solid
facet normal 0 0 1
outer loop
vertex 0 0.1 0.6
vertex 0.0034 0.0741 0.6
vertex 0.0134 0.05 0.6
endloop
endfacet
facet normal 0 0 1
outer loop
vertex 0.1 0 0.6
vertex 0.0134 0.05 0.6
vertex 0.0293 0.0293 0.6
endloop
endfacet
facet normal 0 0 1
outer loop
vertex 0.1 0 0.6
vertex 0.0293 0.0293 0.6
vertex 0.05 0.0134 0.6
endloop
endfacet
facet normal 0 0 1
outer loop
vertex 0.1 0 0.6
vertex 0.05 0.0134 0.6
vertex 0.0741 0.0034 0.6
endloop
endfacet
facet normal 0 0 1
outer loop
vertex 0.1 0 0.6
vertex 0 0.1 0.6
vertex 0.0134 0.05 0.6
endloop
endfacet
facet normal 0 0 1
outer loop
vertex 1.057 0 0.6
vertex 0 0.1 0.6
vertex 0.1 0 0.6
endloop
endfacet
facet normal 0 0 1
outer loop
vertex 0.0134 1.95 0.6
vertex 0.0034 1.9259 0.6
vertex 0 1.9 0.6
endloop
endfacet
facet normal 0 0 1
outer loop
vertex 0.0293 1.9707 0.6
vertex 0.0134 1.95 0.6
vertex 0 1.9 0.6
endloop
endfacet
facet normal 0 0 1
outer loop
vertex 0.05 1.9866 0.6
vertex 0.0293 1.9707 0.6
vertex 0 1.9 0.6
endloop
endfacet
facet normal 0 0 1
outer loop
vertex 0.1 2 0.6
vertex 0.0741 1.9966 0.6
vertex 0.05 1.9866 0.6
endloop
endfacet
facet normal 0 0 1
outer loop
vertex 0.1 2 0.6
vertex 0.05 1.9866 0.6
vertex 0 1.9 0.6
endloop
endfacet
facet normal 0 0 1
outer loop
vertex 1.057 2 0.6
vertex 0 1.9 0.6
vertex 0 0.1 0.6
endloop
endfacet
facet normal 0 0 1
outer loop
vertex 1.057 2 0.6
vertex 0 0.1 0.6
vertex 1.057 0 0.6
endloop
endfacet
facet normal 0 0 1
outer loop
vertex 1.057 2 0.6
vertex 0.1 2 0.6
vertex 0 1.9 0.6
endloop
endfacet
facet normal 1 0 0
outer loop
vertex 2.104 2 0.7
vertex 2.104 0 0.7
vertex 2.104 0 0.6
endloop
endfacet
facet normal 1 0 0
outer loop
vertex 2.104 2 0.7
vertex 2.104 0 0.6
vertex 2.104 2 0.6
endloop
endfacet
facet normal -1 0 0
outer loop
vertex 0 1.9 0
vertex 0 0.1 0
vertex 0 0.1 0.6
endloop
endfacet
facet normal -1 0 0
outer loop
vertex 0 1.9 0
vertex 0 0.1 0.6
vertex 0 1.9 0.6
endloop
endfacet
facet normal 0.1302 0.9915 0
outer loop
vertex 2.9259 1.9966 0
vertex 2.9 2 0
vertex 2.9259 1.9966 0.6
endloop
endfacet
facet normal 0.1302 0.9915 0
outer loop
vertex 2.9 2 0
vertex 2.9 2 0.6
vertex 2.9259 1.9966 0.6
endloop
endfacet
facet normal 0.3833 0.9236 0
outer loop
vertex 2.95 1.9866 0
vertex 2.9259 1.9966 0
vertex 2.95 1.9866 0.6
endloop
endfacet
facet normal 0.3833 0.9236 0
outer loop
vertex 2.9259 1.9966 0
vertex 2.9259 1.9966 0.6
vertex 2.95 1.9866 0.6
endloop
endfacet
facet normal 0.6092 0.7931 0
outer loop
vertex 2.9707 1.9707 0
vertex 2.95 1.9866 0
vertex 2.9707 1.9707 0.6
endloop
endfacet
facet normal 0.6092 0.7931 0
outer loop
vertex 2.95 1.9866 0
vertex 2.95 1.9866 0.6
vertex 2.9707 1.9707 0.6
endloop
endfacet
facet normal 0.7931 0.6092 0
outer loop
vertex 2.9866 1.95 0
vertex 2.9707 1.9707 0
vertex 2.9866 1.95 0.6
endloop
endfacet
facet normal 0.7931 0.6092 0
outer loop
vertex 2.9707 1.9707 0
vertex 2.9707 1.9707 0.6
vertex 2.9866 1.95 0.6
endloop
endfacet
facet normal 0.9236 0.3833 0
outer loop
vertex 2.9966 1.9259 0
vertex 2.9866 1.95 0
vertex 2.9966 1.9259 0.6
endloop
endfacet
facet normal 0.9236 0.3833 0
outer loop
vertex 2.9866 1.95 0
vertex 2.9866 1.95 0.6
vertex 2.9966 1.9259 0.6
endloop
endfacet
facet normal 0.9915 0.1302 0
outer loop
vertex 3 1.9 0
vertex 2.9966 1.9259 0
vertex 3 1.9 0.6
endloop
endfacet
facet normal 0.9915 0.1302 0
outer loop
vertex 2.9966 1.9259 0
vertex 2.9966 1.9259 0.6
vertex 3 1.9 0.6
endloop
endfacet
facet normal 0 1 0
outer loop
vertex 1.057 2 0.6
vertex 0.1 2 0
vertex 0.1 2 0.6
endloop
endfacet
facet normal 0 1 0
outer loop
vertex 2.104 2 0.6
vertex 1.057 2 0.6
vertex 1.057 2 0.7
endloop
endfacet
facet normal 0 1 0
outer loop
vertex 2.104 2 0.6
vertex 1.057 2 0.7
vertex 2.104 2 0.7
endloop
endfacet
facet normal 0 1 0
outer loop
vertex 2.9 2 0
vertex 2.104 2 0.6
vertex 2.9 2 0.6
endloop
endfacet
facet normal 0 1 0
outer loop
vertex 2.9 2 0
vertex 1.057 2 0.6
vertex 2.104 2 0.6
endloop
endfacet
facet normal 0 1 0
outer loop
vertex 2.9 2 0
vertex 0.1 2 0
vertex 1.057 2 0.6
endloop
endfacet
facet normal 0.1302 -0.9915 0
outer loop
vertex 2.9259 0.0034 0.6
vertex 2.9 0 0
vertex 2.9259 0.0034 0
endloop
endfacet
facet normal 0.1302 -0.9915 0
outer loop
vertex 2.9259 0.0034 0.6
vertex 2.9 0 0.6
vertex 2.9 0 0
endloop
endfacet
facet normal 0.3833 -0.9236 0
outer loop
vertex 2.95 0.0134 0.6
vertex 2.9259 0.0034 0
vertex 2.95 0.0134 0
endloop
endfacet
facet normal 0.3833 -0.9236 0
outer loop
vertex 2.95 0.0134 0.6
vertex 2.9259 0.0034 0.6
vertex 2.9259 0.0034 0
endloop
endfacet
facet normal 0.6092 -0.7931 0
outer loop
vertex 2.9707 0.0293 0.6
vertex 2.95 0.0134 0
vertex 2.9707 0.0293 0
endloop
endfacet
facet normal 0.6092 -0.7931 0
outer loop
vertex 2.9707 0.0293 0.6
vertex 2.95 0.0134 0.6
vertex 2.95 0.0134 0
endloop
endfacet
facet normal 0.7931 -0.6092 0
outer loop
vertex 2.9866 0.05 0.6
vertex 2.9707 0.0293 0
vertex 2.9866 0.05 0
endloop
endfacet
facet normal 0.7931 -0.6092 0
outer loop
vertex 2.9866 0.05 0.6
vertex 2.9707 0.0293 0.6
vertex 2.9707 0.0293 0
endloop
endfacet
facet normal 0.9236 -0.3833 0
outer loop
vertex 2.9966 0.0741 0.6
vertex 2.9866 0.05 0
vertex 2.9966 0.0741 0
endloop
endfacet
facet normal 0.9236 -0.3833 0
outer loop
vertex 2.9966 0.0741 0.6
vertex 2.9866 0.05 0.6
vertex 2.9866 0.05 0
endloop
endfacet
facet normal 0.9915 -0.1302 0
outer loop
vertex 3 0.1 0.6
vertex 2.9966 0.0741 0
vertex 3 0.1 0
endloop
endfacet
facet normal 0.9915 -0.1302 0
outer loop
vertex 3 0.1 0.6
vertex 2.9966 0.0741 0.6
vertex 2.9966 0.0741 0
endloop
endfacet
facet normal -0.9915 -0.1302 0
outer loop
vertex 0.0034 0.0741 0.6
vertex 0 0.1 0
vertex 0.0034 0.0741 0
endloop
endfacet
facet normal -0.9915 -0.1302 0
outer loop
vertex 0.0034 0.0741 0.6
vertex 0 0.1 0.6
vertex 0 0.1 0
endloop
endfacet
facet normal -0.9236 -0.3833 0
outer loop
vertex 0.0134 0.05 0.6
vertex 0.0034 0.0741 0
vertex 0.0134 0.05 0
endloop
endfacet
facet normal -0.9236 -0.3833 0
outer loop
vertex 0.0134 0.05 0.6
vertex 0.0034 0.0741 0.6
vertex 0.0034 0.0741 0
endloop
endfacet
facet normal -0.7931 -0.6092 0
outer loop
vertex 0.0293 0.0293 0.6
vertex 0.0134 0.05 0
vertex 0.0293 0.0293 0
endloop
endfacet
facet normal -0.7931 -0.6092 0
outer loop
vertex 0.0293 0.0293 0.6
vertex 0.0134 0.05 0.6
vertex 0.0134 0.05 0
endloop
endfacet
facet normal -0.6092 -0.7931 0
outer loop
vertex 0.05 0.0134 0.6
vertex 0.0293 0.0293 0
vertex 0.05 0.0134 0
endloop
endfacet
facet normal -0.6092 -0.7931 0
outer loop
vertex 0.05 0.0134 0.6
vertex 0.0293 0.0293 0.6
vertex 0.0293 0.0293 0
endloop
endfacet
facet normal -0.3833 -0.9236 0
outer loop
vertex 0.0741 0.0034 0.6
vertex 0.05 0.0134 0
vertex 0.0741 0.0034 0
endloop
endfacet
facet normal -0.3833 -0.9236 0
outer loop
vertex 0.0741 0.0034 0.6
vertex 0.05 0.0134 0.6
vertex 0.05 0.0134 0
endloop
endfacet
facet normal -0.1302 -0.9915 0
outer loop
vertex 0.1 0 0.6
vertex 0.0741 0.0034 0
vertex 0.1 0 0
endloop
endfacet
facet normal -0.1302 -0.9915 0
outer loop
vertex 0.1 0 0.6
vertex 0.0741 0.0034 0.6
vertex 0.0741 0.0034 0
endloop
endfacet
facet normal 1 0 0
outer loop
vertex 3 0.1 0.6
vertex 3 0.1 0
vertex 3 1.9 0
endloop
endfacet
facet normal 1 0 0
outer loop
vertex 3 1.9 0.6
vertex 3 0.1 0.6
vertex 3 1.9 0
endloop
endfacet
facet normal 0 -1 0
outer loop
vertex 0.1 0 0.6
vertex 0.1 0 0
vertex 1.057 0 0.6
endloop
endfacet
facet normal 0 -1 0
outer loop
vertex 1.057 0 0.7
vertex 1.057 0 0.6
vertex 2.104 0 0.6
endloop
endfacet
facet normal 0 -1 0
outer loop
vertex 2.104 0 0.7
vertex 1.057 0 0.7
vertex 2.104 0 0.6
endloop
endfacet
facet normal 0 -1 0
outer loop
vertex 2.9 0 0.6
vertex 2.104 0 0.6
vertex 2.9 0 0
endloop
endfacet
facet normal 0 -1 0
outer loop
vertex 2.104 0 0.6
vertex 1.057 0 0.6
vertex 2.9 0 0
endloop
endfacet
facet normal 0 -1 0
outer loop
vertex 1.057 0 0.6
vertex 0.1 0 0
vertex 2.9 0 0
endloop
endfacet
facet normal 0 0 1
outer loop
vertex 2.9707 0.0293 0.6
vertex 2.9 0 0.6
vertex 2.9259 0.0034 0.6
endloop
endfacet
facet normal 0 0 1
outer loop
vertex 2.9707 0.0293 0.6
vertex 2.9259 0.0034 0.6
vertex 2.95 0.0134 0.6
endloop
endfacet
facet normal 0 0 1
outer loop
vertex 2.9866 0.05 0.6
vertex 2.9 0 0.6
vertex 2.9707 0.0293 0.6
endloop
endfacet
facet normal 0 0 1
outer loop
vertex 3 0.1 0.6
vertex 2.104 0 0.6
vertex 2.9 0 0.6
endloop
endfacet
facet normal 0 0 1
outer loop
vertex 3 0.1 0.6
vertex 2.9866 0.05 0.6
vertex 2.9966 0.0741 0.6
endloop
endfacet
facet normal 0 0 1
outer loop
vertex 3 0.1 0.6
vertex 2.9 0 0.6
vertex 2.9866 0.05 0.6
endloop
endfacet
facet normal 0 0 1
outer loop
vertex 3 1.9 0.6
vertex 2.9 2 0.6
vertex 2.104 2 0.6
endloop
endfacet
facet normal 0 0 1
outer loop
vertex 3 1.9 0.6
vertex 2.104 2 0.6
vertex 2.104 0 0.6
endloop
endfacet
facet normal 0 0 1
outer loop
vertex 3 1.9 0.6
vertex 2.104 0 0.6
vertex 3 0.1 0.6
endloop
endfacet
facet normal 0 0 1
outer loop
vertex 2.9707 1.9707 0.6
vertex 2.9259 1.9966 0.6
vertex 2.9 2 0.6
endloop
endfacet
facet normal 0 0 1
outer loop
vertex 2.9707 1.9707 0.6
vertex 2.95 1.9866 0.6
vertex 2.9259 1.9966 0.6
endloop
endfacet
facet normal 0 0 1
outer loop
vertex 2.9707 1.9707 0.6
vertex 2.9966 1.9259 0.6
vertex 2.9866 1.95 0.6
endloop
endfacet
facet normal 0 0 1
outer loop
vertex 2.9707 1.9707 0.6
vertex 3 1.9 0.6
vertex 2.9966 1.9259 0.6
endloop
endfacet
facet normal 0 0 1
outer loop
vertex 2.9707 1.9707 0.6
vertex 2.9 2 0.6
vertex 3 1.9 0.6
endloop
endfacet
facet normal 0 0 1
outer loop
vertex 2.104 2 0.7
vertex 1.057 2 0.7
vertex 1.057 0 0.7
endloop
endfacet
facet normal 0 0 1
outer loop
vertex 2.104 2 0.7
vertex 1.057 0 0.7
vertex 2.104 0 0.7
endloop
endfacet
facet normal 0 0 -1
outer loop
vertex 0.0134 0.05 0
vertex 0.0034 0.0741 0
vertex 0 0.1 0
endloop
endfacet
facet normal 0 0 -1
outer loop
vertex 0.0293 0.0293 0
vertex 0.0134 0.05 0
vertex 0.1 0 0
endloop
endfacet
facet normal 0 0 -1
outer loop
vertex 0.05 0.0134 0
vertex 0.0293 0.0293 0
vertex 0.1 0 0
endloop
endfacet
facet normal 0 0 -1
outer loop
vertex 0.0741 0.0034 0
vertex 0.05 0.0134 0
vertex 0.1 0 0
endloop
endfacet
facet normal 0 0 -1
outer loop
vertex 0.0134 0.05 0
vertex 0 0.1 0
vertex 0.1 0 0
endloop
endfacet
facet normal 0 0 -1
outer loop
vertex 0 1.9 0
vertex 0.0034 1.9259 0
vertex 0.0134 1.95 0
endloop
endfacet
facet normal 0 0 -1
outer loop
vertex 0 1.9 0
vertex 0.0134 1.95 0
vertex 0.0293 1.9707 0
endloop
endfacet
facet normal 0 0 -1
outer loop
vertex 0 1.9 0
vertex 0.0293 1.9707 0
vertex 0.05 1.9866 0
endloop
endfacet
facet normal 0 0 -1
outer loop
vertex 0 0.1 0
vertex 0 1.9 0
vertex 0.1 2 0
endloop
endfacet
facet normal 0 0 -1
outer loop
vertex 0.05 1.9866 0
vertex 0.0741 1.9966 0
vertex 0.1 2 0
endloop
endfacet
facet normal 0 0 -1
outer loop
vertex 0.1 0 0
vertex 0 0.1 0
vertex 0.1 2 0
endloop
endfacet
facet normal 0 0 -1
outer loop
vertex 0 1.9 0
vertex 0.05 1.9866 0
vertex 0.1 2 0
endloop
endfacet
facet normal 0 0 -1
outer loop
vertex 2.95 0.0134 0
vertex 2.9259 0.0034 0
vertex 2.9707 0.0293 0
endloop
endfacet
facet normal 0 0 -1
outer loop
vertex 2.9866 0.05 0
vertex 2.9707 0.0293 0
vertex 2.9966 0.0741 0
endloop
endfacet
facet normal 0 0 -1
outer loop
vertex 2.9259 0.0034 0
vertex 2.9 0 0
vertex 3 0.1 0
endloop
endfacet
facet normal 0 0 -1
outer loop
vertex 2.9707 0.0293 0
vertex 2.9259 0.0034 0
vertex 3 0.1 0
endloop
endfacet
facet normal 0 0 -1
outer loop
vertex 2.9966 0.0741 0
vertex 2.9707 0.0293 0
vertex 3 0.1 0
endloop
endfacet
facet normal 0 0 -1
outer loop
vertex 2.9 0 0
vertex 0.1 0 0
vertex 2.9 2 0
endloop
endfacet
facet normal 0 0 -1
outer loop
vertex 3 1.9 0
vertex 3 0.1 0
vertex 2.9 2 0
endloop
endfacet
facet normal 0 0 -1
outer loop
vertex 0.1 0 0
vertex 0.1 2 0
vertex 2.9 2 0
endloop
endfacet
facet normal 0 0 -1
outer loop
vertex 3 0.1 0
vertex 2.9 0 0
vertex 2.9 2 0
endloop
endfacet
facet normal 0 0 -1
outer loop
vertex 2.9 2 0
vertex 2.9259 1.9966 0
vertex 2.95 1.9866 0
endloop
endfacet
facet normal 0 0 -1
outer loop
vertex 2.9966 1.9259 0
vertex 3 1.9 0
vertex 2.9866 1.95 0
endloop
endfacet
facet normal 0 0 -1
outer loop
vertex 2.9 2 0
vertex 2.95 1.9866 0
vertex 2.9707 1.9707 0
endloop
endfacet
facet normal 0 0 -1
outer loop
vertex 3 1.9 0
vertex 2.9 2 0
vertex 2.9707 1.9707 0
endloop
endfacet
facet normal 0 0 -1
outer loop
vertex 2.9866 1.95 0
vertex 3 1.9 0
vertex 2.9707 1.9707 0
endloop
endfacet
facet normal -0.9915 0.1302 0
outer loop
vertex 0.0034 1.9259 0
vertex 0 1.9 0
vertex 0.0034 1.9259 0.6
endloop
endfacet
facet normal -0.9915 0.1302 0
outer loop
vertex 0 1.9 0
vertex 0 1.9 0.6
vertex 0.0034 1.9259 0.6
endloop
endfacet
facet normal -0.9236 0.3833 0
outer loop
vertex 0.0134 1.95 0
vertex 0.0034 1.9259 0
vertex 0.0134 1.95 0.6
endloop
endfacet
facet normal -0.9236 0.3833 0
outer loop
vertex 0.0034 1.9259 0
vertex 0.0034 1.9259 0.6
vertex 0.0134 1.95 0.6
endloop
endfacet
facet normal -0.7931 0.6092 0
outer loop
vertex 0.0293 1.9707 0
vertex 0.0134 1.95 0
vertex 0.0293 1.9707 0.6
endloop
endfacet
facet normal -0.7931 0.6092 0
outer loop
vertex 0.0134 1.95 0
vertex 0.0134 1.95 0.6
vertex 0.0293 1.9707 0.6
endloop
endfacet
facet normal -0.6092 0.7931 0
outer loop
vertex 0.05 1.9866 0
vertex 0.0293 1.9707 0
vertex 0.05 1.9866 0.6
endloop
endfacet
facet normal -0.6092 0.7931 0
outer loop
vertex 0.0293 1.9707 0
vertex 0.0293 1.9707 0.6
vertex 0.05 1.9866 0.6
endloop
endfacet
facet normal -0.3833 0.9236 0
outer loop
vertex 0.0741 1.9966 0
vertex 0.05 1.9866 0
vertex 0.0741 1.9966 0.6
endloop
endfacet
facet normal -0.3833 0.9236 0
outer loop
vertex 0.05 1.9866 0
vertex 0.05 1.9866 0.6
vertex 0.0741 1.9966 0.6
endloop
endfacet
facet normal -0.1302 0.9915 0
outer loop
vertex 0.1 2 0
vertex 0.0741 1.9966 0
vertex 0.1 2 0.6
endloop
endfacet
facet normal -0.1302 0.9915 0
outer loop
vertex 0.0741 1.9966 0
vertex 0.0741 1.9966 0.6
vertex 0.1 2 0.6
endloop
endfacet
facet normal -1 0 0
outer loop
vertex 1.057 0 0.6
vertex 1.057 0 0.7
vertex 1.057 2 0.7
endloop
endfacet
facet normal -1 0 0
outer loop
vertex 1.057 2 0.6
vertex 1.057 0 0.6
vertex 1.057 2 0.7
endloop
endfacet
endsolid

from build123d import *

# Parameters (mm, degrees)
SKETCH_1_W           = 3
SKETCH_1_H           = 2
EXTRUDE_1_DEPTH      = 0.7
SKETCH_2_OUTSIDE_W   = 5.734
SKETCH_2_OUTSIDE_H   = 4.734
SKETCH_2_OUTSIDE_W_2 = 1.047048505
SKETCH_2_OUTSIDE_H_2 = 2
CUT_EXTRUDE_1_DEPTH  = 0.1
FILLET_1_R           = 0.1


with BuildPart() as part:
    # 草图1 → 凸台-拉伸1 (new body)
    with BuildSketch(Plane.XY):
        with Locations((1.5, 1)):
            Rectangle(SKETCH_1_W, SKETCH_1_H)
    extrude(amount=EXTRUDE_1_DEPTH)

    # 草图2 outside → 切除-拉伸1 (cut)
    with BuildSketch(Plane.XY.offset(0.7)):
        with Locations((1.5, 1)):
            Rectangle(SKETCH_2_OUTSIDE_W, SKETCH_2_OUTSIDE_H)
        with Locations((1.580478371, 1)):
            Rectangle(SKETCH_2_OUTSIDE_W_2, SKETCH_2_OUTSIDE_H_2, mode=Mode.SUBTRACT)
    extrude(amount=-CUT_EXTRUDE_1_DEPTH, mode=Mode.SUBTRACT)

    # 圆角1
    fillet_1_edges = [part.edges().sort_by_distance(p)[0] for p in [
        (0, 2, 0.3),
        (3, 2, 0.3),
        (3, 0, 0.3),
        (0, 0, 0.3),
    ]]
    fillet(fillet_1_edges, radius=FILLET_1_R)


solid = part.part
